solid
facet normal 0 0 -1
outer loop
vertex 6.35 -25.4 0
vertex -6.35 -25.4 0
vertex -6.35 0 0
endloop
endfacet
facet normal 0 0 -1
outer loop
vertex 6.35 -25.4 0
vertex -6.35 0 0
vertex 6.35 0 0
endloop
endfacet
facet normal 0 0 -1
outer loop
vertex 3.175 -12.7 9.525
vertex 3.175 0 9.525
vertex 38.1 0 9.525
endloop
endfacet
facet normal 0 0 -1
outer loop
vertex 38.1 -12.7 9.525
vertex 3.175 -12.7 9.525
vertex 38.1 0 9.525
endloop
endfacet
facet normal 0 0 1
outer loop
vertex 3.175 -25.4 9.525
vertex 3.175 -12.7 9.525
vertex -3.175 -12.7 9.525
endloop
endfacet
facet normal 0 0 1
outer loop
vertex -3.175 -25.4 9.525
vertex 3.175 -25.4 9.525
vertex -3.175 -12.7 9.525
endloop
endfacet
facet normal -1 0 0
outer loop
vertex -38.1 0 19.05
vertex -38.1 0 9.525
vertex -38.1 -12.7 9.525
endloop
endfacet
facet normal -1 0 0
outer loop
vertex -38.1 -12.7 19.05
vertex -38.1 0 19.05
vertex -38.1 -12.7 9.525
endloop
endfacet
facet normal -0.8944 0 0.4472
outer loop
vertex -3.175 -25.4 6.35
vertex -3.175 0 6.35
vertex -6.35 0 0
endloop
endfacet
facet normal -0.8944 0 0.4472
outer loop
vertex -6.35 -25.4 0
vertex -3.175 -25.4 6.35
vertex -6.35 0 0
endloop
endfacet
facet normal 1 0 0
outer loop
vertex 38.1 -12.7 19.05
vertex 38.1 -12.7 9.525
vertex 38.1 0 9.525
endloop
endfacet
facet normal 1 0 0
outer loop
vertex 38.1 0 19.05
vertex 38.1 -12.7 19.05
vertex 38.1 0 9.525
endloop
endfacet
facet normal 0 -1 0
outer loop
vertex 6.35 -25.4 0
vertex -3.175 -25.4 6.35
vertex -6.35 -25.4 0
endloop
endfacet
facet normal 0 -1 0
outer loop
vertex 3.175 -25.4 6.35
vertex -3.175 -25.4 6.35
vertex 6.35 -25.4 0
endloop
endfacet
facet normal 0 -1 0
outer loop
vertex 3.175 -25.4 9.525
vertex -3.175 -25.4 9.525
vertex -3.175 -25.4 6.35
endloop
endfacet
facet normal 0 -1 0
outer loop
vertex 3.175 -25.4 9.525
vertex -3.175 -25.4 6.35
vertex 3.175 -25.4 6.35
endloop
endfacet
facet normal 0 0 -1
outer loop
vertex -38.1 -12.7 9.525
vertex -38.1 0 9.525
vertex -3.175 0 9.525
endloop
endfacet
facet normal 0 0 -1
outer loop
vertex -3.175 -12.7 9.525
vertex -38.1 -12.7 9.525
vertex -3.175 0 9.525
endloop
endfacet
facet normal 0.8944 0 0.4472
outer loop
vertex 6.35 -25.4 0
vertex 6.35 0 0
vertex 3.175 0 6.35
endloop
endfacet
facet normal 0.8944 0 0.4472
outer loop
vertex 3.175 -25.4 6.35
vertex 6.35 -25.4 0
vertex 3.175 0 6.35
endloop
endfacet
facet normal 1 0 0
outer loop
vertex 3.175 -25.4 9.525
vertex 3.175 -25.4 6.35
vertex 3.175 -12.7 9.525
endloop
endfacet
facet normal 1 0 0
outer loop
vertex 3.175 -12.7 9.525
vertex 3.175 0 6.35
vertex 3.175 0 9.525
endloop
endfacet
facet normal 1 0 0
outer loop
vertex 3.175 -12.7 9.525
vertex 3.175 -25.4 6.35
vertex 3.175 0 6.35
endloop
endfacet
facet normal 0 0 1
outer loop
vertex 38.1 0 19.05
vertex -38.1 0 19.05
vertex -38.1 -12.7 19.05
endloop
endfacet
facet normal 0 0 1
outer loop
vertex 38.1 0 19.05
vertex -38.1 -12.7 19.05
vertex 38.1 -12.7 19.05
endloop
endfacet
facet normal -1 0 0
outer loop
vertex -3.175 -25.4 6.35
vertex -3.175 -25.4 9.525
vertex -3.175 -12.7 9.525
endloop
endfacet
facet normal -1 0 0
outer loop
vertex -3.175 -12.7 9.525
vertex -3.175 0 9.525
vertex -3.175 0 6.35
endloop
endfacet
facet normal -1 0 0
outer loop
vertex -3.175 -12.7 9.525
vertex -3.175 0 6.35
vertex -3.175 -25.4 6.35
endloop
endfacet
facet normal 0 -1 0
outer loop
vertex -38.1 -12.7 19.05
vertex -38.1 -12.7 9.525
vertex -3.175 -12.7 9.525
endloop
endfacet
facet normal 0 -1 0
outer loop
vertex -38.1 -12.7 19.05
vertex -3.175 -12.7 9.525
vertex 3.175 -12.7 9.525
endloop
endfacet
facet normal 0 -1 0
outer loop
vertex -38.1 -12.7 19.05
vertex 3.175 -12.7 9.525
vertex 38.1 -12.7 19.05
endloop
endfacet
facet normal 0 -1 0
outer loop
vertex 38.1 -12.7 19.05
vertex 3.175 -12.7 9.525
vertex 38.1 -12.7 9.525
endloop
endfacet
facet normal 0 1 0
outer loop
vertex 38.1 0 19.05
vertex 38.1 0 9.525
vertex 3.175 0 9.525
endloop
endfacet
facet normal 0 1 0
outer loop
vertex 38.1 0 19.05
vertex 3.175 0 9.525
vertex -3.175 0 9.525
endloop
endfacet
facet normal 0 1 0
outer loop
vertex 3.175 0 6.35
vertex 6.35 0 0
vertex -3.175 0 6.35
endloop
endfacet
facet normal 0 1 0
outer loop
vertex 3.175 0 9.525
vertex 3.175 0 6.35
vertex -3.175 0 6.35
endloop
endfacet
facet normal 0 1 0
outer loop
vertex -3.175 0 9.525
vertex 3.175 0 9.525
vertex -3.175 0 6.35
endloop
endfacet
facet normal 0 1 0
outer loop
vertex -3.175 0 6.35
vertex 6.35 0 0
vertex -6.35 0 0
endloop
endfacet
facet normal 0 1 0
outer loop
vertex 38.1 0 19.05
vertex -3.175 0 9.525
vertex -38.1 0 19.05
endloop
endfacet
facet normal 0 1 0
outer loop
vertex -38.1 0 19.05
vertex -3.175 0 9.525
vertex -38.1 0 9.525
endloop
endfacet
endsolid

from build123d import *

# Parameters (mm, degrees)
F1_DEPTH = 25.4
F3_DEPTH = 9.525


with BuildPart() as f1:
    # F0 (on Front) → F1 (new body)
    with BuildSketch(Plane.XZ):
        Polygon((-6.35, 0), (0, 0), (6.35, 0), (3.175, 6.35), (3.175, 9.525), (-3.175, 9.525), (-3.175, 6.35), align=None)
    extrude(amount=F1_DEPTH)

    # F2 (on face) → F3 (join)
    with BuildSketch(Plane.XY.offset(9.525)):
        Polygon((38.1, 0), (0, 0), (-38.1, 0), (-38.1, -12.7), (0, -12.7), (38.1, -12.7), align=None)
    extrude(amount=F3_DEPTH)


solid = f1.part
